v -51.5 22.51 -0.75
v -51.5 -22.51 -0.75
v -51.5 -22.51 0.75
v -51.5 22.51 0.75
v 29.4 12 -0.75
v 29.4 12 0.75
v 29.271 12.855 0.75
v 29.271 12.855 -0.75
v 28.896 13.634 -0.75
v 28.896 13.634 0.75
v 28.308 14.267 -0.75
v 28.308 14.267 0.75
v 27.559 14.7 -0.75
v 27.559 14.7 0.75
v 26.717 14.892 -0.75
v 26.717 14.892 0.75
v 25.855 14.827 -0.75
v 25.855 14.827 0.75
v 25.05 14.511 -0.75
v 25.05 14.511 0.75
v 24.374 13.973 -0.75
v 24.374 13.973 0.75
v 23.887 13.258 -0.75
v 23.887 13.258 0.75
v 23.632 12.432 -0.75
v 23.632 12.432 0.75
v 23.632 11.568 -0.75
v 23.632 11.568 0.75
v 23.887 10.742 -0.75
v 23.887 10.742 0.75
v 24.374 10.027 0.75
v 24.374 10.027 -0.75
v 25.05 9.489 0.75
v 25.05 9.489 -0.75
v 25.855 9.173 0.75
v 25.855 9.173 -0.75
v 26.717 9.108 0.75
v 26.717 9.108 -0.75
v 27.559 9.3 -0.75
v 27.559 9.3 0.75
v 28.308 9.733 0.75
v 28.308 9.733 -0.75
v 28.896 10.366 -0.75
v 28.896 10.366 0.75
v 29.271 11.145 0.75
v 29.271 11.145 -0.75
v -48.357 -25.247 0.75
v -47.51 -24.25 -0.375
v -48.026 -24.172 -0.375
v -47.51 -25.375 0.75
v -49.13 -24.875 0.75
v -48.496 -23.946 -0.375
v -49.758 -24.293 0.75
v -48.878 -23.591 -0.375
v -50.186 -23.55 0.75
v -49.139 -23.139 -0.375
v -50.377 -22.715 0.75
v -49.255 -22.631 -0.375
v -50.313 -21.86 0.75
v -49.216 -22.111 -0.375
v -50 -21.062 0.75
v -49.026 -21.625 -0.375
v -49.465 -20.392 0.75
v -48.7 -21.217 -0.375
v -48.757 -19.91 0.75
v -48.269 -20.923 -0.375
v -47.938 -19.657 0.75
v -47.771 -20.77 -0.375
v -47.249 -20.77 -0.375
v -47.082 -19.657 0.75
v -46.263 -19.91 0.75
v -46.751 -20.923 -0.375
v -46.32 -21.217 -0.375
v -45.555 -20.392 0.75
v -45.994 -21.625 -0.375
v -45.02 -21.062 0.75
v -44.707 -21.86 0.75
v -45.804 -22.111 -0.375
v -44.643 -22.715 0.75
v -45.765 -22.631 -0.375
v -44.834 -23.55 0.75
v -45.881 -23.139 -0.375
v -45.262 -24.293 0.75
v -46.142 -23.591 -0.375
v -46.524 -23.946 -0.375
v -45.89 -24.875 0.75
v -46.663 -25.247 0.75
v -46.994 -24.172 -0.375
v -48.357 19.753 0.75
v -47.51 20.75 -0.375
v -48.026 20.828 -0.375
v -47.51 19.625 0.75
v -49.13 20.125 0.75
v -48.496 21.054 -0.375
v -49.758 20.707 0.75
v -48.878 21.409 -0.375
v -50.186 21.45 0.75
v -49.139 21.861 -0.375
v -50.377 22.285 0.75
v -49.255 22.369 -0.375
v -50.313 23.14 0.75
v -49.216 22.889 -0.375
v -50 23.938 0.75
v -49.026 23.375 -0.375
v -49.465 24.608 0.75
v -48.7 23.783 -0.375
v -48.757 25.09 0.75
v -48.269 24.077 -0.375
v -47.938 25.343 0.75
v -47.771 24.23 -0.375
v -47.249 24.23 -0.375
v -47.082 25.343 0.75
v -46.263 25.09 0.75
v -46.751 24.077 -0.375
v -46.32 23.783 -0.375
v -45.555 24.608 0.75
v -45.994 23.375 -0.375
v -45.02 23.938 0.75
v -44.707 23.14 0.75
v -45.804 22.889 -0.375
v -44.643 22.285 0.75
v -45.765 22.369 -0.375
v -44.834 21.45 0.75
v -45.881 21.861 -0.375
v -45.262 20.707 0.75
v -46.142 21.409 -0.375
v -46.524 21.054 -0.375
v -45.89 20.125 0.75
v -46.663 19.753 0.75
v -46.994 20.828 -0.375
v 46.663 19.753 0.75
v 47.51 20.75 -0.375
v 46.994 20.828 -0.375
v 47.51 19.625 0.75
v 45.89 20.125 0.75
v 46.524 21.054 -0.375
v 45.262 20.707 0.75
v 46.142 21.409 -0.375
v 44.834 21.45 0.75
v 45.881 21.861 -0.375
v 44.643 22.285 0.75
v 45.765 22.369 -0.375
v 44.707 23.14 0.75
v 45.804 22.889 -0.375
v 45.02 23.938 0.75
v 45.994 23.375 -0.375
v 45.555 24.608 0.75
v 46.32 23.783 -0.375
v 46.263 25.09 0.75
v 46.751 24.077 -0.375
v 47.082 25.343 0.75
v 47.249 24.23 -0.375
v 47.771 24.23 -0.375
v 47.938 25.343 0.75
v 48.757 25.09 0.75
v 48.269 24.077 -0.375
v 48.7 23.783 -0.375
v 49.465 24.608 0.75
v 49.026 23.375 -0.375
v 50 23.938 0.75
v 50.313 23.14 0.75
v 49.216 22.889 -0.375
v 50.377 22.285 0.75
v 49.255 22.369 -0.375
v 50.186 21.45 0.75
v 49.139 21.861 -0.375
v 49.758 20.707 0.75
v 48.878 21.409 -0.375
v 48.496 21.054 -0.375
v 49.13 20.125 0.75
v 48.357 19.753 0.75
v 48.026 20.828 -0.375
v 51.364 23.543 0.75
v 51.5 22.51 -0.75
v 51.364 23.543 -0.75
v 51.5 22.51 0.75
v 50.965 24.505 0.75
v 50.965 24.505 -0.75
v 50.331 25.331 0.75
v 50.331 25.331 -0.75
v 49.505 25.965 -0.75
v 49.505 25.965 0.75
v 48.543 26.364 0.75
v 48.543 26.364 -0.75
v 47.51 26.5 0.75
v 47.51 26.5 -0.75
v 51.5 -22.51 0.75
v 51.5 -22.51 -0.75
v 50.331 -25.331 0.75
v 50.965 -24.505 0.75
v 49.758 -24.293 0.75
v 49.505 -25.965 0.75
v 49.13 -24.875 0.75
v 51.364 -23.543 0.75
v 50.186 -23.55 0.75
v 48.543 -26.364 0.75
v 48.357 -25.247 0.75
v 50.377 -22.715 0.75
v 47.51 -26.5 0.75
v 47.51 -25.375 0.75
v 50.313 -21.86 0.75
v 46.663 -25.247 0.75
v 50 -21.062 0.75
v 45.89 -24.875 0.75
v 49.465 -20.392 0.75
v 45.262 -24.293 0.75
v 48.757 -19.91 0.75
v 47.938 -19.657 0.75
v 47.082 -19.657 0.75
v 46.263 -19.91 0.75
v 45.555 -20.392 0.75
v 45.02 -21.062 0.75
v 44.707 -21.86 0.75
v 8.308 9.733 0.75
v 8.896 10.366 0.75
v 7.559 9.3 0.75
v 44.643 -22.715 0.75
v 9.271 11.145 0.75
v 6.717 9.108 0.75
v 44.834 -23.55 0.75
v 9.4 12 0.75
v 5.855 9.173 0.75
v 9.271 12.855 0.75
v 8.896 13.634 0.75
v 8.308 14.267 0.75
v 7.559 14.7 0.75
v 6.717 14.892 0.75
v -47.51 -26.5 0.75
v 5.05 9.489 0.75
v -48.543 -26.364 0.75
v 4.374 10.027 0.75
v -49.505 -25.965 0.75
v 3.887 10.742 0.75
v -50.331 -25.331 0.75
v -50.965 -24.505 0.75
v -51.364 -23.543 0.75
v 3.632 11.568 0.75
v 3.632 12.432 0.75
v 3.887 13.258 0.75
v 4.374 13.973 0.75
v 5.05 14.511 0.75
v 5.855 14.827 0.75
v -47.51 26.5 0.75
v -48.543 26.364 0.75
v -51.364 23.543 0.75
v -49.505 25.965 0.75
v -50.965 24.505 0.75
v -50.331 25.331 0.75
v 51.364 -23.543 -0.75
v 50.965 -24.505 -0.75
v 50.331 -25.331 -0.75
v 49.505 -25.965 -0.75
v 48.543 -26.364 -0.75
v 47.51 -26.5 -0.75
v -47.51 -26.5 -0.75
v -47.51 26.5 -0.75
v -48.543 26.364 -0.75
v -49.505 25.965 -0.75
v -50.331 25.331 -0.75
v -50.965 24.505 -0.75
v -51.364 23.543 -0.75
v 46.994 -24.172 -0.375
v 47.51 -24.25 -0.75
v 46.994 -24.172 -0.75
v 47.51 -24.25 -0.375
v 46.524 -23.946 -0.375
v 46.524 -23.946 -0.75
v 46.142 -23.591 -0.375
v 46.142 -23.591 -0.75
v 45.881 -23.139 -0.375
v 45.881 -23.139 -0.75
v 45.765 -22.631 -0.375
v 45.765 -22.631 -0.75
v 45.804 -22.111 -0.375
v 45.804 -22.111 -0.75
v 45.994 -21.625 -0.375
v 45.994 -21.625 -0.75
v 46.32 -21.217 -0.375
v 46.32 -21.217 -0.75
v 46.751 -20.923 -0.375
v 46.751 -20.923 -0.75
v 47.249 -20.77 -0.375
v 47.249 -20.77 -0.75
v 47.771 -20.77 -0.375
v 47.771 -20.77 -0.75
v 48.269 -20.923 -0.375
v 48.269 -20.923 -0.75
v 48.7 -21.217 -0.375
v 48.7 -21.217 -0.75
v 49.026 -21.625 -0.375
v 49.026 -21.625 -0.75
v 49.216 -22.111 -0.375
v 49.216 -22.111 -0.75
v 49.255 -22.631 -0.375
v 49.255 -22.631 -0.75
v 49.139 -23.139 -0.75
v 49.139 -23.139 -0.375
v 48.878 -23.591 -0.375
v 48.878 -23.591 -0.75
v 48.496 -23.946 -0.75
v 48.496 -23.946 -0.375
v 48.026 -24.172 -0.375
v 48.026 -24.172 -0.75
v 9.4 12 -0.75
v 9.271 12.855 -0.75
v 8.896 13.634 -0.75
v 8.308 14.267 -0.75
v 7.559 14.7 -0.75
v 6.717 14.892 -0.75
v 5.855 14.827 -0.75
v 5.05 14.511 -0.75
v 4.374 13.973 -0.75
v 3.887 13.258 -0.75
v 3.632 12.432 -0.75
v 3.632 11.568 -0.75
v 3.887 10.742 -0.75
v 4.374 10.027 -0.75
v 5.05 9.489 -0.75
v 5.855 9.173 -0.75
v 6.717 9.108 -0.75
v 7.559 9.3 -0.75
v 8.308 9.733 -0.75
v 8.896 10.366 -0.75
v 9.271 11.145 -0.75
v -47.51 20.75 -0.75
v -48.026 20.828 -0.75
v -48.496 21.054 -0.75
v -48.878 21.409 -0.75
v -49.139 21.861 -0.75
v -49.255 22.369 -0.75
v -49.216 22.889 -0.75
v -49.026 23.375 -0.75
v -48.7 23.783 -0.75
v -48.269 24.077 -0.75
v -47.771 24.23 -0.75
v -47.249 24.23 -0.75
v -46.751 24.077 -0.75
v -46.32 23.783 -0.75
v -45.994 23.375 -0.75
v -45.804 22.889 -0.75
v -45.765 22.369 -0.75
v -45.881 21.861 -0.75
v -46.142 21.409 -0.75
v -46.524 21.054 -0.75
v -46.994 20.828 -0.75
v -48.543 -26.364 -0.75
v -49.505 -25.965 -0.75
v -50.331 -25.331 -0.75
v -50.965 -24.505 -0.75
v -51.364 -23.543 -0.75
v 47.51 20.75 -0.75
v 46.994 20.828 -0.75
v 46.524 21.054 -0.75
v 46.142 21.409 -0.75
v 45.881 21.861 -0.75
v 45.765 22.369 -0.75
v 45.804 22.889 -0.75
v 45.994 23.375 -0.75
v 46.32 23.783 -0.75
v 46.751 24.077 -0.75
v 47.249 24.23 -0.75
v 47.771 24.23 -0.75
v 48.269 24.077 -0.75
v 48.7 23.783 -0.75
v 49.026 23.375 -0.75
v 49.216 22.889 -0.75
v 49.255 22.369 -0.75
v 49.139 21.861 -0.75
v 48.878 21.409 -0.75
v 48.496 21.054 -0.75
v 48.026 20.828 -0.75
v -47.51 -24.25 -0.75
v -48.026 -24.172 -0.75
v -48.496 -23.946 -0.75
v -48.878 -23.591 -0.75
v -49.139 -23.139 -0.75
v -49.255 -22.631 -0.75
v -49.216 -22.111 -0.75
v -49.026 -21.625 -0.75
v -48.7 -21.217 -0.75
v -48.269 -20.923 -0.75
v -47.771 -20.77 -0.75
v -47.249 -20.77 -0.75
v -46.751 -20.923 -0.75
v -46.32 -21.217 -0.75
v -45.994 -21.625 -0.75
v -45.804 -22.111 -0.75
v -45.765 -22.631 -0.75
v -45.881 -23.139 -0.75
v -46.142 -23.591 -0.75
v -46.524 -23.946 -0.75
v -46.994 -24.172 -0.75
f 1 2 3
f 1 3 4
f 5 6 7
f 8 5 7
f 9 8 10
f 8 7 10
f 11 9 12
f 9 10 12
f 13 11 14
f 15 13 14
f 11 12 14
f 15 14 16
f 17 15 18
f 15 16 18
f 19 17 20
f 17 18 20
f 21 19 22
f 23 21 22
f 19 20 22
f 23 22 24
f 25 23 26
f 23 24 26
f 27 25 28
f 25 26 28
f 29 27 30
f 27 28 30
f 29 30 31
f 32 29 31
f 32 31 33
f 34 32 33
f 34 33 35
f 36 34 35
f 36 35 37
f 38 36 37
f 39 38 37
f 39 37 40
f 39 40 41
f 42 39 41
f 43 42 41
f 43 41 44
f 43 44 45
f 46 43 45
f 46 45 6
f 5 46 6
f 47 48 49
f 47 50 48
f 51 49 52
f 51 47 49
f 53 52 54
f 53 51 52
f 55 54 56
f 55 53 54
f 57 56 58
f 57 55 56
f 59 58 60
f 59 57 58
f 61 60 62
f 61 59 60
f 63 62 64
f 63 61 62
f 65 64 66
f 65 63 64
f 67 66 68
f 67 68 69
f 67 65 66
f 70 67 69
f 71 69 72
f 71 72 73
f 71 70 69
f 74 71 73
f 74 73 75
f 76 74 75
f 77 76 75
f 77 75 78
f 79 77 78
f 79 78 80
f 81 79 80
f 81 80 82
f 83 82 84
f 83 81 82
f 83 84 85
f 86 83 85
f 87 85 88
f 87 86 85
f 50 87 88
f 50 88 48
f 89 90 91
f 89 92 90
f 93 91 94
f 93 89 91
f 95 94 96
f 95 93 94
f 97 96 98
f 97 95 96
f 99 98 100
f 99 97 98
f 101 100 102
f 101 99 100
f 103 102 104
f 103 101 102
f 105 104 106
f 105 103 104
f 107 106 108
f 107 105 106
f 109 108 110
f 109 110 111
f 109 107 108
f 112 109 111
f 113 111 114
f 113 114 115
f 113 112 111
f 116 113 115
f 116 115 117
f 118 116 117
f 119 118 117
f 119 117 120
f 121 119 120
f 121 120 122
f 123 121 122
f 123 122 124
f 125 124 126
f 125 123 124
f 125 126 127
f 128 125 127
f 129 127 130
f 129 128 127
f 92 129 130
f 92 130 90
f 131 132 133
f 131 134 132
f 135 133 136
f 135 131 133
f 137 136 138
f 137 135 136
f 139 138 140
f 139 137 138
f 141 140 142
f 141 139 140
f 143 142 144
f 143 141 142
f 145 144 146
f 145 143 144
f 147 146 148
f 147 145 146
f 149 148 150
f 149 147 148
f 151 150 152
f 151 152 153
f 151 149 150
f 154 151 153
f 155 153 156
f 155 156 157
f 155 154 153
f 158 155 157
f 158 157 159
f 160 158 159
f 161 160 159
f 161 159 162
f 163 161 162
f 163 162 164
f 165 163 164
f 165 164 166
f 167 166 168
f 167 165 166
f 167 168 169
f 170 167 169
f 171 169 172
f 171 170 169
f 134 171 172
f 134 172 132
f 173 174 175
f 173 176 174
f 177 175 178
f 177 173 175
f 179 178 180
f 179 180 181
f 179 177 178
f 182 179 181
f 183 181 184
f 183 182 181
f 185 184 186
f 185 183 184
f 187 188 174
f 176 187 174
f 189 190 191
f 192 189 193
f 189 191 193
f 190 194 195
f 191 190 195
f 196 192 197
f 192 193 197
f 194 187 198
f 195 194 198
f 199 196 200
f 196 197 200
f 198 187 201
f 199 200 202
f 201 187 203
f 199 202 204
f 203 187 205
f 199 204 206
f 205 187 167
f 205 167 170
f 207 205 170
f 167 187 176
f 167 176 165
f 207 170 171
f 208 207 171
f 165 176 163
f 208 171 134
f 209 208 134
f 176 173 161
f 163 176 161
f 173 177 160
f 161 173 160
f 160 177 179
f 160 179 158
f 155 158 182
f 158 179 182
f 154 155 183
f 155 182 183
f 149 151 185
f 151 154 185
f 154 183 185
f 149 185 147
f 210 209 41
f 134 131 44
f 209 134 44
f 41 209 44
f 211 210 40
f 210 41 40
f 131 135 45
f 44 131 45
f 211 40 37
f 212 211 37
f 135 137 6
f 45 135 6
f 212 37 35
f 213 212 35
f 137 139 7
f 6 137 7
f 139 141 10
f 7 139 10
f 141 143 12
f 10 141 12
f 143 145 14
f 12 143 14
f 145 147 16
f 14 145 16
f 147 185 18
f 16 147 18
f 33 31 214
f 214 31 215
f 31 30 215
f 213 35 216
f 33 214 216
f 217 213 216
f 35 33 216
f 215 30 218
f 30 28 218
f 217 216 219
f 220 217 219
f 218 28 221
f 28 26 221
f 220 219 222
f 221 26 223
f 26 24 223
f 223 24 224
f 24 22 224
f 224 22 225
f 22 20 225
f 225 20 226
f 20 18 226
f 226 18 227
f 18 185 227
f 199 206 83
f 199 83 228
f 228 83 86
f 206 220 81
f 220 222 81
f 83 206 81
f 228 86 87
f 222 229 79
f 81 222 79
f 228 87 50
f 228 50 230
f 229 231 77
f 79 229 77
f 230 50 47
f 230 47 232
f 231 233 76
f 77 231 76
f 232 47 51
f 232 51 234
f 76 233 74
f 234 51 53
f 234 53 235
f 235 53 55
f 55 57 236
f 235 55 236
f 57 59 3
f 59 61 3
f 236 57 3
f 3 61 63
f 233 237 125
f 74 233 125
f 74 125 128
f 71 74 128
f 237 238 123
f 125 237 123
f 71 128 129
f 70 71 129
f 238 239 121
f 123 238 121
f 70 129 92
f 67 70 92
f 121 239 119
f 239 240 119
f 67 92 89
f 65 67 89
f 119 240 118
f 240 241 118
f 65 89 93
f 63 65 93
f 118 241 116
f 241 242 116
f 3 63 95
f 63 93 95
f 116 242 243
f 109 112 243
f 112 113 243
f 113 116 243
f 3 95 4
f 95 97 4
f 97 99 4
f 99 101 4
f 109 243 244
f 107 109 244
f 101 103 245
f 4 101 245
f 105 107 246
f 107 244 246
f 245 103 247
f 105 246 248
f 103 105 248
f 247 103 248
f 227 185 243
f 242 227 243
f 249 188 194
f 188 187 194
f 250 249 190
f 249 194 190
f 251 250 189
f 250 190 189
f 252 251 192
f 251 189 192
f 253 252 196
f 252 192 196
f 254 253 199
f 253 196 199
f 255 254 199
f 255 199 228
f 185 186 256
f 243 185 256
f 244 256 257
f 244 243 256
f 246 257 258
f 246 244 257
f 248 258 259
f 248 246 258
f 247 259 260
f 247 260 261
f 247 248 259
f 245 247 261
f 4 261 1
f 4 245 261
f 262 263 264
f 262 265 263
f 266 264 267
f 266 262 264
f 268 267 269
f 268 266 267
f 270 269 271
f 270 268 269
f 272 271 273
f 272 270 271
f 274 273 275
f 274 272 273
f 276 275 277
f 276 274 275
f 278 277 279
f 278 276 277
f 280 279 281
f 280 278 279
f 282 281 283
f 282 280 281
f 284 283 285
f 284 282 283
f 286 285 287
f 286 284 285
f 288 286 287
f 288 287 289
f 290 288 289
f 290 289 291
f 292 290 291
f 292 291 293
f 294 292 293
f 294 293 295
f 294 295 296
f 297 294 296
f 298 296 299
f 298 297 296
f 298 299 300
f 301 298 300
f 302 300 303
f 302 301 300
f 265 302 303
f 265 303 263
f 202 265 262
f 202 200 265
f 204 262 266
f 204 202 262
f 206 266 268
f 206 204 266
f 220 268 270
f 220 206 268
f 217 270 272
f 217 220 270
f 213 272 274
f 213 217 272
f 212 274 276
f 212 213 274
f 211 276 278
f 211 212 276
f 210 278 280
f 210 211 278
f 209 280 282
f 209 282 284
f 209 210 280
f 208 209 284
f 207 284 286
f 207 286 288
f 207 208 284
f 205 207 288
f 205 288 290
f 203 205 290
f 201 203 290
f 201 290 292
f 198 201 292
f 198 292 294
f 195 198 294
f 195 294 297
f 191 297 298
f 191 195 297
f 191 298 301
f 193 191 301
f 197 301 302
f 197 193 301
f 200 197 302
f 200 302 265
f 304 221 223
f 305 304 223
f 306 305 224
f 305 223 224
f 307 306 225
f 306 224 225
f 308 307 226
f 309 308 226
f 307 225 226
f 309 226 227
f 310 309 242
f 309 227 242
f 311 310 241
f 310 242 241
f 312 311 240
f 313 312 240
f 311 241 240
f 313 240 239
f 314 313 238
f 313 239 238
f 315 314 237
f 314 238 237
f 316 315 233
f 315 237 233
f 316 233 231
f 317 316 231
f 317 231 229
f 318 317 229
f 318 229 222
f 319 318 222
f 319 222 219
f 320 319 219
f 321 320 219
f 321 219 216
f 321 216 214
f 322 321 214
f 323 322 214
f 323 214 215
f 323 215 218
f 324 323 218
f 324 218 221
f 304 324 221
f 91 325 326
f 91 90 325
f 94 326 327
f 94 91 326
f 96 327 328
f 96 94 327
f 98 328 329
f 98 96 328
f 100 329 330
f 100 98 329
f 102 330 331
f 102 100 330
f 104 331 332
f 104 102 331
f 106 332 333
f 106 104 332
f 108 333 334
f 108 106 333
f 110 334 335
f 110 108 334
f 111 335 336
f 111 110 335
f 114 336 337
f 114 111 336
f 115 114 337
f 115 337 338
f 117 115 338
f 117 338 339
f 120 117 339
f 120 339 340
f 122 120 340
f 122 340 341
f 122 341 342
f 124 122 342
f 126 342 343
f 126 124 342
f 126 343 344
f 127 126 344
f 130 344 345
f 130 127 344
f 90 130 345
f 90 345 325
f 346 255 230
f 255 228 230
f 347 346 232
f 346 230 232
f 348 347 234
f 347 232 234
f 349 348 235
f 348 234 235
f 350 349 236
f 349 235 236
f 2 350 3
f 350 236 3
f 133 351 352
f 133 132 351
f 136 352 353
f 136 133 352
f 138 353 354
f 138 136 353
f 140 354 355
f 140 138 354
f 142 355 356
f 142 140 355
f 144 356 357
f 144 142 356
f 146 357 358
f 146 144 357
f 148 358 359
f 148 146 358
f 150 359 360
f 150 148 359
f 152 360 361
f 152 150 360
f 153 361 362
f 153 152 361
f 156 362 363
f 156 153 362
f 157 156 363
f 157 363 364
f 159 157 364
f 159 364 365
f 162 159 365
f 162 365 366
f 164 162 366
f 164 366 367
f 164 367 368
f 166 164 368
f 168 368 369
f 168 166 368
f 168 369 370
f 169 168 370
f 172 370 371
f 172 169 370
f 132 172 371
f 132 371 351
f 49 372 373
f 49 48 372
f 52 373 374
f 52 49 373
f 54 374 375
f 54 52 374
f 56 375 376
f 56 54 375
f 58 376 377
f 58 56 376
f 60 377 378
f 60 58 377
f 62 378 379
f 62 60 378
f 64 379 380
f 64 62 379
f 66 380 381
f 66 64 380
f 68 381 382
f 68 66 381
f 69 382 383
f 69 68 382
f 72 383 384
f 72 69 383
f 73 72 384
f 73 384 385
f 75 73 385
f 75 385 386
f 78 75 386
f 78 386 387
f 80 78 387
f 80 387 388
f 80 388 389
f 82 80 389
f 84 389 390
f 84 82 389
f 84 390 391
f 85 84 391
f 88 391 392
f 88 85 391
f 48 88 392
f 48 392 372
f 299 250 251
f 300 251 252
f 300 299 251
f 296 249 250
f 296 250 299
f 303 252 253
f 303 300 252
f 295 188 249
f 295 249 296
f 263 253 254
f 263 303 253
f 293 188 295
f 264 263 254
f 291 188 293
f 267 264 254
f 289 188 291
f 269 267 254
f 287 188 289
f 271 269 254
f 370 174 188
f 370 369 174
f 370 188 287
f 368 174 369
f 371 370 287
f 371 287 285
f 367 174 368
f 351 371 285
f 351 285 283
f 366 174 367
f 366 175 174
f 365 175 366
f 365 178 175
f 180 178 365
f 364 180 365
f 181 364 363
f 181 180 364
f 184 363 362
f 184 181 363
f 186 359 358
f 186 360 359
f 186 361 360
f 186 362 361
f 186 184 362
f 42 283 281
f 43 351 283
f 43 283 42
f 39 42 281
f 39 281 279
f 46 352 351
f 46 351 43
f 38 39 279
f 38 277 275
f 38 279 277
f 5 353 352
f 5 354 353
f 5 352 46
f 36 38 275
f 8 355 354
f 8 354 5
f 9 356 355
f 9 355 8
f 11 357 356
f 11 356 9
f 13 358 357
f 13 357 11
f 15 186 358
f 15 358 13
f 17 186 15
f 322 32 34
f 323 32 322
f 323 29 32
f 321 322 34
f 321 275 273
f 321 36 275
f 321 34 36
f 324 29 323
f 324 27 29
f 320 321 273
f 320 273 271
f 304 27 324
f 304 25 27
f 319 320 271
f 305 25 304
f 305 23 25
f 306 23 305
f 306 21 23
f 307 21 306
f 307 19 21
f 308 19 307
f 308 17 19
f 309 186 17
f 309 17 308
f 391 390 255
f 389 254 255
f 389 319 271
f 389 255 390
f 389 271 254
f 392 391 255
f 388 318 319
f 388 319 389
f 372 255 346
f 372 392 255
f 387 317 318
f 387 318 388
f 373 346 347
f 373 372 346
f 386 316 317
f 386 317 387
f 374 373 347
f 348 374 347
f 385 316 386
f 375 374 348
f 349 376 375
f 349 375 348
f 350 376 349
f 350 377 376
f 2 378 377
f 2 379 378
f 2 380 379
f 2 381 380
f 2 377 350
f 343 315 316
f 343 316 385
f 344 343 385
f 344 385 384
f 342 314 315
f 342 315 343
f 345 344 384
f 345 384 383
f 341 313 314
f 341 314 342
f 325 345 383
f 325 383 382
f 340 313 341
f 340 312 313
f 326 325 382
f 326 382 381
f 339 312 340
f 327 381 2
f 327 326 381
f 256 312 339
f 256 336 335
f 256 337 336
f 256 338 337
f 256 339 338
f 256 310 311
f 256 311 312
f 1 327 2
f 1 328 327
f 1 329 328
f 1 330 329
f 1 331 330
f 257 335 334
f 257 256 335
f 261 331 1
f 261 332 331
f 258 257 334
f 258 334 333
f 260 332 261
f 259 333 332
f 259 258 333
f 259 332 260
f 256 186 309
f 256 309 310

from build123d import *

# Parameters (mm, degrees)
ESQUISSE1_W                                 = 103
ESQUISSE1_H                                 = 53
BOSS_EXTRU_1_DEPTH                          = 1.5
FRAISAGE_POUR_VIS_T_TE_FRAIS_E_M31_AT_COUNT = 2
FRAISAGE_POUR_VIS_T_TE_FRAIS_E_M31_AT_PITCH = 95.02
FRAISAGE_POUR_VIS_T_TE_FRAIS_E_M31_2_COUNT  = 2
FRAISAGE_POUR_VIS_T_TE_FRAIS_E_M31_2_PITCH  = 105.137055314
FRAISAGE_POUR_VIS_T_TE_FRAIS_E_M31_3_COUNT  = 2
FRAISAGE_POUR_VIS_T_TE_FRAIS_E_M31_3_PITCH  = 45
CONG_1_R                                    = 3.99
ESQUISSE4_R                                 = 2.9
ENL_V_MAT_EXTRU_1_DEPTH                     = 2.5


with BuildPart() as part:
    # Esquisse1 → Boss.-Extru.1 (new body)
    with BuildSketch(Plane(origin=(0, 0, -0.75), x_dir=(-1, 0, 0), z_dir=(0, 0, -1))):
        Rectangle(ESQUISSE1_W, ESQUISSE1_H)
    extrude(amount=-BOSS_EXTRU_1_DEPTH)

    # Esquisse2 → Fraisage pour vis à tête fraisée M31 (revolve, cut)
    with BuildSketch(Plane(origin=(-47.51, 22.5, 0.75), x_dir=(0, -1, 0), z_dir=(1, 0, 0))):
        Polygon((0, 0), (0, 1.5), (1.75, 1.5), (1.75, 1.125), (2.875, 0), align=None)
    fraisage_pour_vis_t_te_frais_e_m31 = revolve(axis=Axis((-47.51, 22.5, 7.1), (0, 0, -1)), mode=Mode.SUBTRACT)

    # Fraisage pour vis à tête fraisée M31 at: Fraisage pour vis à tête fraisée M31 ×2
    with Locations(*[(i * FRAISAGE_POUR_VIS_T_TE_FRAIS_E_M31_AT_PITCH, 0, 0) for i in range(1, FRAISAGE_POUR_VIS_T_TE_FRAIS_E_M31_AT_COUNT)]):
        add(fraisage_pour_vis_t_te_frais_e_m31, mode=Mode.SUBTRACT)

    # Fraisage pour vis _ t_te frais_e M31 2: Fraisage pour vis à tête fraisée M31 ×2
    with Locations(*[Vector(0.903772697, -0.428012748, 0) * (i * FRAISAGE_POUR_VIS_T_TE_FRAIS_E_M31_2_PITCH) for i in range(1, FRAISAGE_POUR_VIS_T_TE_FRAIS_E_M31_2_COUNT)]):
        add(fraisage_pour_vis_t_te_frais_e_m31, mode=Mode.SUBTRACT)

    # Fraisage pour vis _ t_te frais_e M31 3: Fraisage pour vis à tête fraisée M31 ×2
    with Locations(*[(0, -i * FRAISAGE_POUR_VIS_T_TE_FRAIS_E_M31_3_PITCH, 0) for i in range(1, FRAISAGE_POUR_VIS_T_TE_FRAIS_E_M31_3_COUNT)]):
        add(fraisage_pour_vis_t_te_frais_e_m31, mode=Mode.SUBTRACT)

    # Congé1
    cong_1_edges = [part.edges().sort_by_distance(p)[0] for p in [
        (51.5, 26.5, 0),
        (-51.5, 26.5, 0),
        (-51.5, -26.5, 0),
        (51.5, -26.5, 0),
    ]]
    fillet(cong_1_edges, radius=CONG_1_R)

    # Esquisse4 → Enlèv. mat.-Extru.1 (cut, through all)
    with BuildSketch(Plane.XY.offset(0.75)):
        with Locations((26.5, 12)):
            Circle(ESQUISSE4_R)
        with Locations((6.5, 12)):
            Circle(ESQUISSE4_R)
    extrude(amount=-ENL_V_MAT_EXTRU_1_DEPTH, mode=Mode.SUBTRACT)


solid = part.part
